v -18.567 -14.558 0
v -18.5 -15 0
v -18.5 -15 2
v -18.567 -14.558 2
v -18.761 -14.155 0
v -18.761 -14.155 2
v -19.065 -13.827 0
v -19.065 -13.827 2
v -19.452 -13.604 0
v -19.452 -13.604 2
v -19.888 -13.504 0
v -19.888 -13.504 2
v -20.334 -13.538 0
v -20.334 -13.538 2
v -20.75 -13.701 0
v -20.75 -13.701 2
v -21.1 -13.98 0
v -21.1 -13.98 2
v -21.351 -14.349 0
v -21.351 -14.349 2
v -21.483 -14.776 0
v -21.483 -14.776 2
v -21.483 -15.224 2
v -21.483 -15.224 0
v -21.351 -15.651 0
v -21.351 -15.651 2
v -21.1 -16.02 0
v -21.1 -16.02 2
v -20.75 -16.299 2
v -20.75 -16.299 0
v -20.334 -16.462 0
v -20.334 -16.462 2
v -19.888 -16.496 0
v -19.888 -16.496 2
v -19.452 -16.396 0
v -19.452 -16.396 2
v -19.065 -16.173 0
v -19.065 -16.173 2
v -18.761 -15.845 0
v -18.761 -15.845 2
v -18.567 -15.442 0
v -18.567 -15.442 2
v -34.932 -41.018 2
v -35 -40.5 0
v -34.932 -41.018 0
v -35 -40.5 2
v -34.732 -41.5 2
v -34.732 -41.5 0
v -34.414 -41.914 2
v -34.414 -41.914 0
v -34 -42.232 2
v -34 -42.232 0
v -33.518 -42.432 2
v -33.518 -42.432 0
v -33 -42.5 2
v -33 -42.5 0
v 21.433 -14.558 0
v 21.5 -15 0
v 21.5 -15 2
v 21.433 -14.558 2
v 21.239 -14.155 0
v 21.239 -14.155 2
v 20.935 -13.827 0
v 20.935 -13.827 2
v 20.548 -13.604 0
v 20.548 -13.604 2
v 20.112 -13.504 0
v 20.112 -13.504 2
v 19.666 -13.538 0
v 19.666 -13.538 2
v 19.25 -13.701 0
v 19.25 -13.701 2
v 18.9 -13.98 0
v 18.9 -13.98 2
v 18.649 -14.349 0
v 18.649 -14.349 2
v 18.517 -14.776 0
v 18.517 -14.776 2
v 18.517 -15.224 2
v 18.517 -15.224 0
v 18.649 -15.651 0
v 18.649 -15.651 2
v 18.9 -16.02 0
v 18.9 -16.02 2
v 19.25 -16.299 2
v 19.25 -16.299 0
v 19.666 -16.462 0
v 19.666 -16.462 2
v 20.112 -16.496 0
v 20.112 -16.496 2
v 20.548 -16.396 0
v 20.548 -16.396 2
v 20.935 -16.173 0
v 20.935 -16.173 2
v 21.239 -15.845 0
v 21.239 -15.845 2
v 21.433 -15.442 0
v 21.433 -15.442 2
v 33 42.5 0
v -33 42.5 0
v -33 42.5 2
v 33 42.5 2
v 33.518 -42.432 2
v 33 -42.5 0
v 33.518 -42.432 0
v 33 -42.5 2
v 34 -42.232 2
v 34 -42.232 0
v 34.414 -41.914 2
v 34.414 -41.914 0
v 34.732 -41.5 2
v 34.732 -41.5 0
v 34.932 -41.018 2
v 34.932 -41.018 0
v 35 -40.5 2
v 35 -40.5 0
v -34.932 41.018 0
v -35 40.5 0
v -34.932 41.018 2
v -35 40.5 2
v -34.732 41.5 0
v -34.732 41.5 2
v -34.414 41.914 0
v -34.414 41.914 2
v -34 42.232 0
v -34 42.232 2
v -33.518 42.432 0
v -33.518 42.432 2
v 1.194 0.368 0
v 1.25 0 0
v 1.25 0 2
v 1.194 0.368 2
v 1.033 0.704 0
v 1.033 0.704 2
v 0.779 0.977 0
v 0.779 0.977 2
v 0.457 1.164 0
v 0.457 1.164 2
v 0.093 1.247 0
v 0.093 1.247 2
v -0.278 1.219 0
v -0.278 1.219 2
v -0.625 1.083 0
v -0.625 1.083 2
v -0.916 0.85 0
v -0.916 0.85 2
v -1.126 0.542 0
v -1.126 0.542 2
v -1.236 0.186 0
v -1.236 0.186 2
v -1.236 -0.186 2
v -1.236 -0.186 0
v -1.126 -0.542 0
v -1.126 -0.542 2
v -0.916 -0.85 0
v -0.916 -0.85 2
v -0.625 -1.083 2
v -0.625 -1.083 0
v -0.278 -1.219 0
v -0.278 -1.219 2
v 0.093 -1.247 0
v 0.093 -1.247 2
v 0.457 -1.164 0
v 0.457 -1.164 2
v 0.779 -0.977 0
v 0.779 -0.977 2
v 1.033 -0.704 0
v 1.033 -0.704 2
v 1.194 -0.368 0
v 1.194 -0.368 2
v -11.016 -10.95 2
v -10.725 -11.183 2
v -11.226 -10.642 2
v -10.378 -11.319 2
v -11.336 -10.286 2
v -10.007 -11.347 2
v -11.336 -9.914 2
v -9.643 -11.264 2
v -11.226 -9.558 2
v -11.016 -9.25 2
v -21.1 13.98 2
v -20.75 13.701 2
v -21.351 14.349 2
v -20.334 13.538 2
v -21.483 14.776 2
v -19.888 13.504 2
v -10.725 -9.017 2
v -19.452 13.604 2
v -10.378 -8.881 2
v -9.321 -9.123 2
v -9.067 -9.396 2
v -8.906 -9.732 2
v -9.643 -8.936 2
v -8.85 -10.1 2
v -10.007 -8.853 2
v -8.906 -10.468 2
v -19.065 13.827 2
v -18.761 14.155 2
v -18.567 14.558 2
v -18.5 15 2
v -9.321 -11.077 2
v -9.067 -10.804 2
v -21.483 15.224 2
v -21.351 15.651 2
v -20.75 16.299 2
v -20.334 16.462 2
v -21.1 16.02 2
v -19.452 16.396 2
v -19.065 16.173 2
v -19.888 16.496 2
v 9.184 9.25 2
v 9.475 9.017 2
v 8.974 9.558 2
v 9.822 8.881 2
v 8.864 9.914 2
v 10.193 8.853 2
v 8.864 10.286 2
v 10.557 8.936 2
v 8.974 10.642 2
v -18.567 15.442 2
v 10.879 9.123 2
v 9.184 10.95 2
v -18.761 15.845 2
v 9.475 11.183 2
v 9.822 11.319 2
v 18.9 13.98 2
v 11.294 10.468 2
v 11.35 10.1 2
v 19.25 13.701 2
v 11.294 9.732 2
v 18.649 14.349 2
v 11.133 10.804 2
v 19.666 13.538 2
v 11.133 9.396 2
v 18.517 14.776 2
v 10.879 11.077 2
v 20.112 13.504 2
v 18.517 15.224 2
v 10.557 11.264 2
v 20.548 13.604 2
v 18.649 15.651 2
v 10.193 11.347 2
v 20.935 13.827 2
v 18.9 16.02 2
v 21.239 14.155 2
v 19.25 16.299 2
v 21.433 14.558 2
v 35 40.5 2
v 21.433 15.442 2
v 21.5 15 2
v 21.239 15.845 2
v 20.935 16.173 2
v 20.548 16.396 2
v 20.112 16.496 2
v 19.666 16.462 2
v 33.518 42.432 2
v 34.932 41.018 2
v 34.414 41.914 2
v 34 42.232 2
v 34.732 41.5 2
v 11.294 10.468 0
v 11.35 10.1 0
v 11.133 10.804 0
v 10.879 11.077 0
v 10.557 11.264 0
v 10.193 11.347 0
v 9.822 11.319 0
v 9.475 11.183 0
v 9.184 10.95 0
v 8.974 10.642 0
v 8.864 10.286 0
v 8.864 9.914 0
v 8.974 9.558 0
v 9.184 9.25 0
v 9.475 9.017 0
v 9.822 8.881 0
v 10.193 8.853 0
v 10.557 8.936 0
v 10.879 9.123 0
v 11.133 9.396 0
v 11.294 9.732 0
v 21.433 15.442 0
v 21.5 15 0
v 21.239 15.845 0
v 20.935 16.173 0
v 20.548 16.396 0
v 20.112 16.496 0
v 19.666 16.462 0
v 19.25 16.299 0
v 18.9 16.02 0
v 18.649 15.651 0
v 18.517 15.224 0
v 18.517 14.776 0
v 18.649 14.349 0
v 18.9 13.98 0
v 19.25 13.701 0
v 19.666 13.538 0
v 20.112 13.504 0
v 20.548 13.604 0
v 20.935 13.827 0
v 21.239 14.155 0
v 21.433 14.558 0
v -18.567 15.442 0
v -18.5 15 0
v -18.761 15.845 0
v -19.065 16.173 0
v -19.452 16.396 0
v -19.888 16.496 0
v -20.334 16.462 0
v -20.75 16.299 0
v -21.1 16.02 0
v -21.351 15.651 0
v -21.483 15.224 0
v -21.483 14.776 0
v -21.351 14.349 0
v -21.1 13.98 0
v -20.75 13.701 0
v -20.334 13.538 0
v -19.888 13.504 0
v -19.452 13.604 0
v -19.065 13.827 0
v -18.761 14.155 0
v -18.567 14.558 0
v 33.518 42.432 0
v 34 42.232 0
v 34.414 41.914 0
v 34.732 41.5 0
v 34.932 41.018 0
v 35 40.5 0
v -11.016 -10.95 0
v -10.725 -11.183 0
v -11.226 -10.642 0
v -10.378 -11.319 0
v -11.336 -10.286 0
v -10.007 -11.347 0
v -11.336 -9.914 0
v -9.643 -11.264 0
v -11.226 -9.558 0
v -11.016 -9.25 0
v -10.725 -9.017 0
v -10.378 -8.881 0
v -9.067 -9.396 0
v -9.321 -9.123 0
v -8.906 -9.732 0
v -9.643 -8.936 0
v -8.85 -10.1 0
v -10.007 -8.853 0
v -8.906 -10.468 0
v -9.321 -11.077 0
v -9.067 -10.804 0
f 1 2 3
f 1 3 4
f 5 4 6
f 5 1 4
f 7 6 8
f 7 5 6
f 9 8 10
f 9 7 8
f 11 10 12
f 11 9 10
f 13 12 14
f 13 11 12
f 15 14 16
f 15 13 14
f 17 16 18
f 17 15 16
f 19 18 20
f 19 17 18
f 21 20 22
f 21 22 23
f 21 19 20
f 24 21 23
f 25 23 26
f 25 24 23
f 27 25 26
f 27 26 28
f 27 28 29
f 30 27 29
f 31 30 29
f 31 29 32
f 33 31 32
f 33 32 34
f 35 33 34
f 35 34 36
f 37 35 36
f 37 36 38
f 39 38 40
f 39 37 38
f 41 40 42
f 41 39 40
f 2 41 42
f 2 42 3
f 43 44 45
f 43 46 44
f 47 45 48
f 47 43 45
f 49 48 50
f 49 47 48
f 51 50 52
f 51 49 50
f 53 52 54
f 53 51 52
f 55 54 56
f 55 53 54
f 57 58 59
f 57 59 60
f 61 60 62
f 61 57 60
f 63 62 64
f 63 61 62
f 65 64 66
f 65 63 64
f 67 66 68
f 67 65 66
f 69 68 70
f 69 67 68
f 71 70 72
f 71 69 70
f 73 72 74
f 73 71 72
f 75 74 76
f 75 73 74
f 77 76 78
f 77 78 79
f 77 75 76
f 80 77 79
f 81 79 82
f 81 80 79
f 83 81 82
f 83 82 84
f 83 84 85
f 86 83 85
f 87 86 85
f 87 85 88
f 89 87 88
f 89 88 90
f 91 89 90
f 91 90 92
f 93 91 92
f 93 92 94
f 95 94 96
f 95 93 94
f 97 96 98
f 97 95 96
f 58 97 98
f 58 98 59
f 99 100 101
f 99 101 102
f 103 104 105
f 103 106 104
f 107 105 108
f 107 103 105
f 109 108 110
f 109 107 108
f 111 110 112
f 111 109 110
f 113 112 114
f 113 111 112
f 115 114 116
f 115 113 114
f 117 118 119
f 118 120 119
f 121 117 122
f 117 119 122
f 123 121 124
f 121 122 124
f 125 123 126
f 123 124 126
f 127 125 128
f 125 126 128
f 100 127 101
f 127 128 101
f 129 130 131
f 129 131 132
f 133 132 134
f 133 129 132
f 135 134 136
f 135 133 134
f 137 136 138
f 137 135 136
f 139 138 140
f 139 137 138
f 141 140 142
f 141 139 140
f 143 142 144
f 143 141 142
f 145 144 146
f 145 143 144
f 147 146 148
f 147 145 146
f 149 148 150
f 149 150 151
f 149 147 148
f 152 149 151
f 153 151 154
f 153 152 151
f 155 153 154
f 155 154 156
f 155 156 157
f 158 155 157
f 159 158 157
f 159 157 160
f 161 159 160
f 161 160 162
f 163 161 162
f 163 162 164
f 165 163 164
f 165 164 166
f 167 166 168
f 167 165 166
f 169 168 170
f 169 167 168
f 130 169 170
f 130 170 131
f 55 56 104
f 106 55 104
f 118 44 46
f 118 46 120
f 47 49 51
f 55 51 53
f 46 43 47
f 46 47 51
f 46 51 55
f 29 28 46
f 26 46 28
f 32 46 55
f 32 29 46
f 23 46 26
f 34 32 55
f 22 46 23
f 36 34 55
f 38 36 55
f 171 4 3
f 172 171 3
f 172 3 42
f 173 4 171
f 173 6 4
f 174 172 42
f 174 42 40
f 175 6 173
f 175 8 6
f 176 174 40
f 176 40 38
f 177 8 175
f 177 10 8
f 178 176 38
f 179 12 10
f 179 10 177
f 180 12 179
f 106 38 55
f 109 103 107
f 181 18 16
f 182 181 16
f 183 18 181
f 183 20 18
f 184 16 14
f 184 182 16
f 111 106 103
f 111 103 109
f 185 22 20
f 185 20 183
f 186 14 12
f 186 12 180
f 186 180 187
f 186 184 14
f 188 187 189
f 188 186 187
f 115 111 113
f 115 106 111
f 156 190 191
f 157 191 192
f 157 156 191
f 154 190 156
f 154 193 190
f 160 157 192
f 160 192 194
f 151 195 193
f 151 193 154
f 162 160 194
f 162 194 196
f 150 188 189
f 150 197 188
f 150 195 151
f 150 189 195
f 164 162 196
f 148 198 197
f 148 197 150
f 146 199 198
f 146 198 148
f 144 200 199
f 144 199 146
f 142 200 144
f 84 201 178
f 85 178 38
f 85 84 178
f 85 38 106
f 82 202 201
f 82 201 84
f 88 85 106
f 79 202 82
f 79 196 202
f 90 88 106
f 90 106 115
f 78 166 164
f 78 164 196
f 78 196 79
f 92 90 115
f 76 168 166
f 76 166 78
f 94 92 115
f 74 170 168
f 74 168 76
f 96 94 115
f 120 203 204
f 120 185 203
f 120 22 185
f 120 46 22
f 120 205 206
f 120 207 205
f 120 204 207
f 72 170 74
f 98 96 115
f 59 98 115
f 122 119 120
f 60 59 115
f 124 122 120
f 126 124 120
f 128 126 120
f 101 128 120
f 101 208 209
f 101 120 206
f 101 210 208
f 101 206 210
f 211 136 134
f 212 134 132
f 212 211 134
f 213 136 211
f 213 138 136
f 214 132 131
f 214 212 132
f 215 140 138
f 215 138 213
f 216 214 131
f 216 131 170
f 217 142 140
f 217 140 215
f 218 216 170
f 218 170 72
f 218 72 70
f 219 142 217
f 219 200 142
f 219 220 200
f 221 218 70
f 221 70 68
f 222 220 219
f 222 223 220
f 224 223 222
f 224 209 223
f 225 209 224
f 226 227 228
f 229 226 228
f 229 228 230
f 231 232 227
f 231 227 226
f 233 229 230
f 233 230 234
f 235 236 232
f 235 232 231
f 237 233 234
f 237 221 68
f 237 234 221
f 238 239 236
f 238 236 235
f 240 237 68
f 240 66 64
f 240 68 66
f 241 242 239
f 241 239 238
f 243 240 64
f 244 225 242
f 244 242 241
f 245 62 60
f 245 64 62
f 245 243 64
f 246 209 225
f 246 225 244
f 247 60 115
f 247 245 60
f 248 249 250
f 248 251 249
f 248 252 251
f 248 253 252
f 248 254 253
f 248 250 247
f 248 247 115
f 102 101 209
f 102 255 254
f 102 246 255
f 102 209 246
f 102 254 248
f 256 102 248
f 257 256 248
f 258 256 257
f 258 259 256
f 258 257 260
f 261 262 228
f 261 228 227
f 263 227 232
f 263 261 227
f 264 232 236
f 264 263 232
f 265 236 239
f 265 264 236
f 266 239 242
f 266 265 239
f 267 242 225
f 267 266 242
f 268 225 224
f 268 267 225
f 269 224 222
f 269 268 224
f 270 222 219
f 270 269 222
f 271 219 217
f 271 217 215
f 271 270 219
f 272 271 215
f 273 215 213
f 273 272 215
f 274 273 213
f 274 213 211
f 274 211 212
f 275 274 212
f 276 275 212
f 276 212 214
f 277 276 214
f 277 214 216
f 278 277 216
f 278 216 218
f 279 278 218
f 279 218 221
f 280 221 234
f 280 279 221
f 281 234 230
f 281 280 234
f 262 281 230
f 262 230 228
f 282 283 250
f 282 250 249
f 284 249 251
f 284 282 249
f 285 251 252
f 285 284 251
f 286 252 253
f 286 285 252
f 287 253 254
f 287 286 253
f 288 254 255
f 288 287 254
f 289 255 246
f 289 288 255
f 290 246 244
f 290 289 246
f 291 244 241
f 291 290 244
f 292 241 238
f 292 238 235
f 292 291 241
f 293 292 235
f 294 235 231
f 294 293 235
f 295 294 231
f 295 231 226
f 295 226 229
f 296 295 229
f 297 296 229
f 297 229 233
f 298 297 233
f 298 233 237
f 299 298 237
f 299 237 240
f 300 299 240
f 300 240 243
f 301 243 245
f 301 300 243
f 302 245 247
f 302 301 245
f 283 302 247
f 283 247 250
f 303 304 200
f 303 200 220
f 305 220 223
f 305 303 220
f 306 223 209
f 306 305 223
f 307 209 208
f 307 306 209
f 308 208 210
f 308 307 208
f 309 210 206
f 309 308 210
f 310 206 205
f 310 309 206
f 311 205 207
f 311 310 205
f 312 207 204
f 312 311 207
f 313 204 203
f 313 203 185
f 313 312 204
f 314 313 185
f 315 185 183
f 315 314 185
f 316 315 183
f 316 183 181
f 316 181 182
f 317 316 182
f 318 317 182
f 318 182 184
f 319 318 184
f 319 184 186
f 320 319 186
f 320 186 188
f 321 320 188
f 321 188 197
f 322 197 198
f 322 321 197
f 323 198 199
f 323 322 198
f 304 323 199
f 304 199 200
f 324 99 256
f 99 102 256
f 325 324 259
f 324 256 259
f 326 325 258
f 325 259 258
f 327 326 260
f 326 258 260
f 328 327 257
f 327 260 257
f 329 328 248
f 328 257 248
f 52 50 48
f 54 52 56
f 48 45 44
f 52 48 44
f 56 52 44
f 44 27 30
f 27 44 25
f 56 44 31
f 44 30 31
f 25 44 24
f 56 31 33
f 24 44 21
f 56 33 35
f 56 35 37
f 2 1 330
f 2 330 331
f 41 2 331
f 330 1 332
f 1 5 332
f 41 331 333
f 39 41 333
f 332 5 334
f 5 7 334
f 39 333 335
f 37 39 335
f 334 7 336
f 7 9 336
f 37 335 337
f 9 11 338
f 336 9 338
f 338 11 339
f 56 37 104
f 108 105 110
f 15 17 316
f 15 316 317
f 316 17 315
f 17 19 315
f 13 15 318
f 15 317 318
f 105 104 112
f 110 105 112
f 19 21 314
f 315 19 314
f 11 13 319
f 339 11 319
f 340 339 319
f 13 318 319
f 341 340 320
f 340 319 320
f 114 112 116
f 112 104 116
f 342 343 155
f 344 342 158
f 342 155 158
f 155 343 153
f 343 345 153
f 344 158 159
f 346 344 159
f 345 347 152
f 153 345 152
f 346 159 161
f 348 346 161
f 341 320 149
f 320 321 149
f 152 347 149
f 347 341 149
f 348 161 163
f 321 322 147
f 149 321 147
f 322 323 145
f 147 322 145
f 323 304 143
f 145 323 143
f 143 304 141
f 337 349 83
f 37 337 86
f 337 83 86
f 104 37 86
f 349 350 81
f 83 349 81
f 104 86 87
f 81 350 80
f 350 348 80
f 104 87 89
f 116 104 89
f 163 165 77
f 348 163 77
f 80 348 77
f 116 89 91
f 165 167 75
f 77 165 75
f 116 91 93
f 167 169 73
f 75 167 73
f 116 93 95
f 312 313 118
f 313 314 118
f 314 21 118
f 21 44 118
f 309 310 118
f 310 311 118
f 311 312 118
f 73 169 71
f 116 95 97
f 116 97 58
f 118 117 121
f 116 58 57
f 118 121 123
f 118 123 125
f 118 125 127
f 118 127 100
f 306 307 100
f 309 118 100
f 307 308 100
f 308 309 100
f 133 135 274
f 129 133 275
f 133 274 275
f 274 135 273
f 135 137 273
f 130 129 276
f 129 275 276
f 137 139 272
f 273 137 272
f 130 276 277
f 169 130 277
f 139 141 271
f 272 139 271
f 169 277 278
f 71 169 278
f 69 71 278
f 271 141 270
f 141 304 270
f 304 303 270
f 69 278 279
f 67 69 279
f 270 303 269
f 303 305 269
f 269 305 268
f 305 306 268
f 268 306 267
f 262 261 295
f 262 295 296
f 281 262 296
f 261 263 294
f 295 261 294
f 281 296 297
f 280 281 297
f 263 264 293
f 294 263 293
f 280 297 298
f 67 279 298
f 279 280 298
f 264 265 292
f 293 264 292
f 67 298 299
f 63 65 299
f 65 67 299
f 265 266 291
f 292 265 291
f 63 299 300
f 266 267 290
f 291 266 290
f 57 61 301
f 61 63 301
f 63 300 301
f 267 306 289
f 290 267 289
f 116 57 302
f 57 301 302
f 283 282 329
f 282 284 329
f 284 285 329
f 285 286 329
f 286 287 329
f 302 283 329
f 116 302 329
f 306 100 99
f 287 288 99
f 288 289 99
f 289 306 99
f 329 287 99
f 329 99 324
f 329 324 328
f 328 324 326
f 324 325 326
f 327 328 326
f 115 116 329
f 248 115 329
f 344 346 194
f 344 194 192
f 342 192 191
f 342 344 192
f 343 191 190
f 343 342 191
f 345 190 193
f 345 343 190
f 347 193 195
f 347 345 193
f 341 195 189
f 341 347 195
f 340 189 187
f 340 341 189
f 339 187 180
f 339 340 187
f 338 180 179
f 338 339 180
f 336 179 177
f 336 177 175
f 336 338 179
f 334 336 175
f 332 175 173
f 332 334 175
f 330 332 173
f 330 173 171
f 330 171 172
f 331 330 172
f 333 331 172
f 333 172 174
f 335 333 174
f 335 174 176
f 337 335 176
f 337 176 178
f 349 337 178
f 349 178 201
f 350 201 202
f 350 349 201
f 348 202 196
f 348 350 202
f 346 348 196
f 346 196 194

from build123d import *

# Parameters (mm, degrees)
SKETCH_1_W      = 70
SKETCH_1_H      = 85
SKETCH_1_R      = 1.5
SKETCH_1_R_2    = 1.25
EXTRUDE_1_DEPTH = 2
FILLET_1_R      = 2


with BuildPart() as part:
    # 草图1 → 凸台-拉伸1 (new body)
    with BuildSketch(Plane.XY):
        Rectangle(SKETCH_1_W, SKETCH_1_H)
        with Locations((-20, 15)):
            Circle(SKETCH_1_R, mode=Mode.SUBTRACT)
        with Locations((20, 15)):
            Circle(SKETCH_1_R, mode=Mode.SUBTRACT)
        with Locations((-20, -15)):
            Circle(SKETCH_1_R, mode=Mode.SUBTRACT)
        with Locations((20, -15)):
            Circle(SKETCH_1_R, mode=Mode.SUBTRACT)
        with Locations((10.1, 10.1)):
            Circle(SKETCH_1_R_2, mode=Mode.SUBTRACT)
        with Locations((-10.1, -10.1)):
            Circle(SKETCH_1_R_2, mode=Mode.SUBTRACT)
        Circle(SKETCH_1_R_2, mode=Mode.SUBTRACT)
    extrude(amount=EXTRUDE_1_DEPTH)

    # 圆角1
    fillet_1_edges = [part.edges().sort_by_distance(p)[0] for p in [
        (35, -42.5, 1),
        (-35, -42.5, 1),
        (-35, 42.5, 1),
        (35, 42.5, 1),
    ]]
    fillet(fillet_1_edges, radius=FILLET_1_R)


solid = part.part
